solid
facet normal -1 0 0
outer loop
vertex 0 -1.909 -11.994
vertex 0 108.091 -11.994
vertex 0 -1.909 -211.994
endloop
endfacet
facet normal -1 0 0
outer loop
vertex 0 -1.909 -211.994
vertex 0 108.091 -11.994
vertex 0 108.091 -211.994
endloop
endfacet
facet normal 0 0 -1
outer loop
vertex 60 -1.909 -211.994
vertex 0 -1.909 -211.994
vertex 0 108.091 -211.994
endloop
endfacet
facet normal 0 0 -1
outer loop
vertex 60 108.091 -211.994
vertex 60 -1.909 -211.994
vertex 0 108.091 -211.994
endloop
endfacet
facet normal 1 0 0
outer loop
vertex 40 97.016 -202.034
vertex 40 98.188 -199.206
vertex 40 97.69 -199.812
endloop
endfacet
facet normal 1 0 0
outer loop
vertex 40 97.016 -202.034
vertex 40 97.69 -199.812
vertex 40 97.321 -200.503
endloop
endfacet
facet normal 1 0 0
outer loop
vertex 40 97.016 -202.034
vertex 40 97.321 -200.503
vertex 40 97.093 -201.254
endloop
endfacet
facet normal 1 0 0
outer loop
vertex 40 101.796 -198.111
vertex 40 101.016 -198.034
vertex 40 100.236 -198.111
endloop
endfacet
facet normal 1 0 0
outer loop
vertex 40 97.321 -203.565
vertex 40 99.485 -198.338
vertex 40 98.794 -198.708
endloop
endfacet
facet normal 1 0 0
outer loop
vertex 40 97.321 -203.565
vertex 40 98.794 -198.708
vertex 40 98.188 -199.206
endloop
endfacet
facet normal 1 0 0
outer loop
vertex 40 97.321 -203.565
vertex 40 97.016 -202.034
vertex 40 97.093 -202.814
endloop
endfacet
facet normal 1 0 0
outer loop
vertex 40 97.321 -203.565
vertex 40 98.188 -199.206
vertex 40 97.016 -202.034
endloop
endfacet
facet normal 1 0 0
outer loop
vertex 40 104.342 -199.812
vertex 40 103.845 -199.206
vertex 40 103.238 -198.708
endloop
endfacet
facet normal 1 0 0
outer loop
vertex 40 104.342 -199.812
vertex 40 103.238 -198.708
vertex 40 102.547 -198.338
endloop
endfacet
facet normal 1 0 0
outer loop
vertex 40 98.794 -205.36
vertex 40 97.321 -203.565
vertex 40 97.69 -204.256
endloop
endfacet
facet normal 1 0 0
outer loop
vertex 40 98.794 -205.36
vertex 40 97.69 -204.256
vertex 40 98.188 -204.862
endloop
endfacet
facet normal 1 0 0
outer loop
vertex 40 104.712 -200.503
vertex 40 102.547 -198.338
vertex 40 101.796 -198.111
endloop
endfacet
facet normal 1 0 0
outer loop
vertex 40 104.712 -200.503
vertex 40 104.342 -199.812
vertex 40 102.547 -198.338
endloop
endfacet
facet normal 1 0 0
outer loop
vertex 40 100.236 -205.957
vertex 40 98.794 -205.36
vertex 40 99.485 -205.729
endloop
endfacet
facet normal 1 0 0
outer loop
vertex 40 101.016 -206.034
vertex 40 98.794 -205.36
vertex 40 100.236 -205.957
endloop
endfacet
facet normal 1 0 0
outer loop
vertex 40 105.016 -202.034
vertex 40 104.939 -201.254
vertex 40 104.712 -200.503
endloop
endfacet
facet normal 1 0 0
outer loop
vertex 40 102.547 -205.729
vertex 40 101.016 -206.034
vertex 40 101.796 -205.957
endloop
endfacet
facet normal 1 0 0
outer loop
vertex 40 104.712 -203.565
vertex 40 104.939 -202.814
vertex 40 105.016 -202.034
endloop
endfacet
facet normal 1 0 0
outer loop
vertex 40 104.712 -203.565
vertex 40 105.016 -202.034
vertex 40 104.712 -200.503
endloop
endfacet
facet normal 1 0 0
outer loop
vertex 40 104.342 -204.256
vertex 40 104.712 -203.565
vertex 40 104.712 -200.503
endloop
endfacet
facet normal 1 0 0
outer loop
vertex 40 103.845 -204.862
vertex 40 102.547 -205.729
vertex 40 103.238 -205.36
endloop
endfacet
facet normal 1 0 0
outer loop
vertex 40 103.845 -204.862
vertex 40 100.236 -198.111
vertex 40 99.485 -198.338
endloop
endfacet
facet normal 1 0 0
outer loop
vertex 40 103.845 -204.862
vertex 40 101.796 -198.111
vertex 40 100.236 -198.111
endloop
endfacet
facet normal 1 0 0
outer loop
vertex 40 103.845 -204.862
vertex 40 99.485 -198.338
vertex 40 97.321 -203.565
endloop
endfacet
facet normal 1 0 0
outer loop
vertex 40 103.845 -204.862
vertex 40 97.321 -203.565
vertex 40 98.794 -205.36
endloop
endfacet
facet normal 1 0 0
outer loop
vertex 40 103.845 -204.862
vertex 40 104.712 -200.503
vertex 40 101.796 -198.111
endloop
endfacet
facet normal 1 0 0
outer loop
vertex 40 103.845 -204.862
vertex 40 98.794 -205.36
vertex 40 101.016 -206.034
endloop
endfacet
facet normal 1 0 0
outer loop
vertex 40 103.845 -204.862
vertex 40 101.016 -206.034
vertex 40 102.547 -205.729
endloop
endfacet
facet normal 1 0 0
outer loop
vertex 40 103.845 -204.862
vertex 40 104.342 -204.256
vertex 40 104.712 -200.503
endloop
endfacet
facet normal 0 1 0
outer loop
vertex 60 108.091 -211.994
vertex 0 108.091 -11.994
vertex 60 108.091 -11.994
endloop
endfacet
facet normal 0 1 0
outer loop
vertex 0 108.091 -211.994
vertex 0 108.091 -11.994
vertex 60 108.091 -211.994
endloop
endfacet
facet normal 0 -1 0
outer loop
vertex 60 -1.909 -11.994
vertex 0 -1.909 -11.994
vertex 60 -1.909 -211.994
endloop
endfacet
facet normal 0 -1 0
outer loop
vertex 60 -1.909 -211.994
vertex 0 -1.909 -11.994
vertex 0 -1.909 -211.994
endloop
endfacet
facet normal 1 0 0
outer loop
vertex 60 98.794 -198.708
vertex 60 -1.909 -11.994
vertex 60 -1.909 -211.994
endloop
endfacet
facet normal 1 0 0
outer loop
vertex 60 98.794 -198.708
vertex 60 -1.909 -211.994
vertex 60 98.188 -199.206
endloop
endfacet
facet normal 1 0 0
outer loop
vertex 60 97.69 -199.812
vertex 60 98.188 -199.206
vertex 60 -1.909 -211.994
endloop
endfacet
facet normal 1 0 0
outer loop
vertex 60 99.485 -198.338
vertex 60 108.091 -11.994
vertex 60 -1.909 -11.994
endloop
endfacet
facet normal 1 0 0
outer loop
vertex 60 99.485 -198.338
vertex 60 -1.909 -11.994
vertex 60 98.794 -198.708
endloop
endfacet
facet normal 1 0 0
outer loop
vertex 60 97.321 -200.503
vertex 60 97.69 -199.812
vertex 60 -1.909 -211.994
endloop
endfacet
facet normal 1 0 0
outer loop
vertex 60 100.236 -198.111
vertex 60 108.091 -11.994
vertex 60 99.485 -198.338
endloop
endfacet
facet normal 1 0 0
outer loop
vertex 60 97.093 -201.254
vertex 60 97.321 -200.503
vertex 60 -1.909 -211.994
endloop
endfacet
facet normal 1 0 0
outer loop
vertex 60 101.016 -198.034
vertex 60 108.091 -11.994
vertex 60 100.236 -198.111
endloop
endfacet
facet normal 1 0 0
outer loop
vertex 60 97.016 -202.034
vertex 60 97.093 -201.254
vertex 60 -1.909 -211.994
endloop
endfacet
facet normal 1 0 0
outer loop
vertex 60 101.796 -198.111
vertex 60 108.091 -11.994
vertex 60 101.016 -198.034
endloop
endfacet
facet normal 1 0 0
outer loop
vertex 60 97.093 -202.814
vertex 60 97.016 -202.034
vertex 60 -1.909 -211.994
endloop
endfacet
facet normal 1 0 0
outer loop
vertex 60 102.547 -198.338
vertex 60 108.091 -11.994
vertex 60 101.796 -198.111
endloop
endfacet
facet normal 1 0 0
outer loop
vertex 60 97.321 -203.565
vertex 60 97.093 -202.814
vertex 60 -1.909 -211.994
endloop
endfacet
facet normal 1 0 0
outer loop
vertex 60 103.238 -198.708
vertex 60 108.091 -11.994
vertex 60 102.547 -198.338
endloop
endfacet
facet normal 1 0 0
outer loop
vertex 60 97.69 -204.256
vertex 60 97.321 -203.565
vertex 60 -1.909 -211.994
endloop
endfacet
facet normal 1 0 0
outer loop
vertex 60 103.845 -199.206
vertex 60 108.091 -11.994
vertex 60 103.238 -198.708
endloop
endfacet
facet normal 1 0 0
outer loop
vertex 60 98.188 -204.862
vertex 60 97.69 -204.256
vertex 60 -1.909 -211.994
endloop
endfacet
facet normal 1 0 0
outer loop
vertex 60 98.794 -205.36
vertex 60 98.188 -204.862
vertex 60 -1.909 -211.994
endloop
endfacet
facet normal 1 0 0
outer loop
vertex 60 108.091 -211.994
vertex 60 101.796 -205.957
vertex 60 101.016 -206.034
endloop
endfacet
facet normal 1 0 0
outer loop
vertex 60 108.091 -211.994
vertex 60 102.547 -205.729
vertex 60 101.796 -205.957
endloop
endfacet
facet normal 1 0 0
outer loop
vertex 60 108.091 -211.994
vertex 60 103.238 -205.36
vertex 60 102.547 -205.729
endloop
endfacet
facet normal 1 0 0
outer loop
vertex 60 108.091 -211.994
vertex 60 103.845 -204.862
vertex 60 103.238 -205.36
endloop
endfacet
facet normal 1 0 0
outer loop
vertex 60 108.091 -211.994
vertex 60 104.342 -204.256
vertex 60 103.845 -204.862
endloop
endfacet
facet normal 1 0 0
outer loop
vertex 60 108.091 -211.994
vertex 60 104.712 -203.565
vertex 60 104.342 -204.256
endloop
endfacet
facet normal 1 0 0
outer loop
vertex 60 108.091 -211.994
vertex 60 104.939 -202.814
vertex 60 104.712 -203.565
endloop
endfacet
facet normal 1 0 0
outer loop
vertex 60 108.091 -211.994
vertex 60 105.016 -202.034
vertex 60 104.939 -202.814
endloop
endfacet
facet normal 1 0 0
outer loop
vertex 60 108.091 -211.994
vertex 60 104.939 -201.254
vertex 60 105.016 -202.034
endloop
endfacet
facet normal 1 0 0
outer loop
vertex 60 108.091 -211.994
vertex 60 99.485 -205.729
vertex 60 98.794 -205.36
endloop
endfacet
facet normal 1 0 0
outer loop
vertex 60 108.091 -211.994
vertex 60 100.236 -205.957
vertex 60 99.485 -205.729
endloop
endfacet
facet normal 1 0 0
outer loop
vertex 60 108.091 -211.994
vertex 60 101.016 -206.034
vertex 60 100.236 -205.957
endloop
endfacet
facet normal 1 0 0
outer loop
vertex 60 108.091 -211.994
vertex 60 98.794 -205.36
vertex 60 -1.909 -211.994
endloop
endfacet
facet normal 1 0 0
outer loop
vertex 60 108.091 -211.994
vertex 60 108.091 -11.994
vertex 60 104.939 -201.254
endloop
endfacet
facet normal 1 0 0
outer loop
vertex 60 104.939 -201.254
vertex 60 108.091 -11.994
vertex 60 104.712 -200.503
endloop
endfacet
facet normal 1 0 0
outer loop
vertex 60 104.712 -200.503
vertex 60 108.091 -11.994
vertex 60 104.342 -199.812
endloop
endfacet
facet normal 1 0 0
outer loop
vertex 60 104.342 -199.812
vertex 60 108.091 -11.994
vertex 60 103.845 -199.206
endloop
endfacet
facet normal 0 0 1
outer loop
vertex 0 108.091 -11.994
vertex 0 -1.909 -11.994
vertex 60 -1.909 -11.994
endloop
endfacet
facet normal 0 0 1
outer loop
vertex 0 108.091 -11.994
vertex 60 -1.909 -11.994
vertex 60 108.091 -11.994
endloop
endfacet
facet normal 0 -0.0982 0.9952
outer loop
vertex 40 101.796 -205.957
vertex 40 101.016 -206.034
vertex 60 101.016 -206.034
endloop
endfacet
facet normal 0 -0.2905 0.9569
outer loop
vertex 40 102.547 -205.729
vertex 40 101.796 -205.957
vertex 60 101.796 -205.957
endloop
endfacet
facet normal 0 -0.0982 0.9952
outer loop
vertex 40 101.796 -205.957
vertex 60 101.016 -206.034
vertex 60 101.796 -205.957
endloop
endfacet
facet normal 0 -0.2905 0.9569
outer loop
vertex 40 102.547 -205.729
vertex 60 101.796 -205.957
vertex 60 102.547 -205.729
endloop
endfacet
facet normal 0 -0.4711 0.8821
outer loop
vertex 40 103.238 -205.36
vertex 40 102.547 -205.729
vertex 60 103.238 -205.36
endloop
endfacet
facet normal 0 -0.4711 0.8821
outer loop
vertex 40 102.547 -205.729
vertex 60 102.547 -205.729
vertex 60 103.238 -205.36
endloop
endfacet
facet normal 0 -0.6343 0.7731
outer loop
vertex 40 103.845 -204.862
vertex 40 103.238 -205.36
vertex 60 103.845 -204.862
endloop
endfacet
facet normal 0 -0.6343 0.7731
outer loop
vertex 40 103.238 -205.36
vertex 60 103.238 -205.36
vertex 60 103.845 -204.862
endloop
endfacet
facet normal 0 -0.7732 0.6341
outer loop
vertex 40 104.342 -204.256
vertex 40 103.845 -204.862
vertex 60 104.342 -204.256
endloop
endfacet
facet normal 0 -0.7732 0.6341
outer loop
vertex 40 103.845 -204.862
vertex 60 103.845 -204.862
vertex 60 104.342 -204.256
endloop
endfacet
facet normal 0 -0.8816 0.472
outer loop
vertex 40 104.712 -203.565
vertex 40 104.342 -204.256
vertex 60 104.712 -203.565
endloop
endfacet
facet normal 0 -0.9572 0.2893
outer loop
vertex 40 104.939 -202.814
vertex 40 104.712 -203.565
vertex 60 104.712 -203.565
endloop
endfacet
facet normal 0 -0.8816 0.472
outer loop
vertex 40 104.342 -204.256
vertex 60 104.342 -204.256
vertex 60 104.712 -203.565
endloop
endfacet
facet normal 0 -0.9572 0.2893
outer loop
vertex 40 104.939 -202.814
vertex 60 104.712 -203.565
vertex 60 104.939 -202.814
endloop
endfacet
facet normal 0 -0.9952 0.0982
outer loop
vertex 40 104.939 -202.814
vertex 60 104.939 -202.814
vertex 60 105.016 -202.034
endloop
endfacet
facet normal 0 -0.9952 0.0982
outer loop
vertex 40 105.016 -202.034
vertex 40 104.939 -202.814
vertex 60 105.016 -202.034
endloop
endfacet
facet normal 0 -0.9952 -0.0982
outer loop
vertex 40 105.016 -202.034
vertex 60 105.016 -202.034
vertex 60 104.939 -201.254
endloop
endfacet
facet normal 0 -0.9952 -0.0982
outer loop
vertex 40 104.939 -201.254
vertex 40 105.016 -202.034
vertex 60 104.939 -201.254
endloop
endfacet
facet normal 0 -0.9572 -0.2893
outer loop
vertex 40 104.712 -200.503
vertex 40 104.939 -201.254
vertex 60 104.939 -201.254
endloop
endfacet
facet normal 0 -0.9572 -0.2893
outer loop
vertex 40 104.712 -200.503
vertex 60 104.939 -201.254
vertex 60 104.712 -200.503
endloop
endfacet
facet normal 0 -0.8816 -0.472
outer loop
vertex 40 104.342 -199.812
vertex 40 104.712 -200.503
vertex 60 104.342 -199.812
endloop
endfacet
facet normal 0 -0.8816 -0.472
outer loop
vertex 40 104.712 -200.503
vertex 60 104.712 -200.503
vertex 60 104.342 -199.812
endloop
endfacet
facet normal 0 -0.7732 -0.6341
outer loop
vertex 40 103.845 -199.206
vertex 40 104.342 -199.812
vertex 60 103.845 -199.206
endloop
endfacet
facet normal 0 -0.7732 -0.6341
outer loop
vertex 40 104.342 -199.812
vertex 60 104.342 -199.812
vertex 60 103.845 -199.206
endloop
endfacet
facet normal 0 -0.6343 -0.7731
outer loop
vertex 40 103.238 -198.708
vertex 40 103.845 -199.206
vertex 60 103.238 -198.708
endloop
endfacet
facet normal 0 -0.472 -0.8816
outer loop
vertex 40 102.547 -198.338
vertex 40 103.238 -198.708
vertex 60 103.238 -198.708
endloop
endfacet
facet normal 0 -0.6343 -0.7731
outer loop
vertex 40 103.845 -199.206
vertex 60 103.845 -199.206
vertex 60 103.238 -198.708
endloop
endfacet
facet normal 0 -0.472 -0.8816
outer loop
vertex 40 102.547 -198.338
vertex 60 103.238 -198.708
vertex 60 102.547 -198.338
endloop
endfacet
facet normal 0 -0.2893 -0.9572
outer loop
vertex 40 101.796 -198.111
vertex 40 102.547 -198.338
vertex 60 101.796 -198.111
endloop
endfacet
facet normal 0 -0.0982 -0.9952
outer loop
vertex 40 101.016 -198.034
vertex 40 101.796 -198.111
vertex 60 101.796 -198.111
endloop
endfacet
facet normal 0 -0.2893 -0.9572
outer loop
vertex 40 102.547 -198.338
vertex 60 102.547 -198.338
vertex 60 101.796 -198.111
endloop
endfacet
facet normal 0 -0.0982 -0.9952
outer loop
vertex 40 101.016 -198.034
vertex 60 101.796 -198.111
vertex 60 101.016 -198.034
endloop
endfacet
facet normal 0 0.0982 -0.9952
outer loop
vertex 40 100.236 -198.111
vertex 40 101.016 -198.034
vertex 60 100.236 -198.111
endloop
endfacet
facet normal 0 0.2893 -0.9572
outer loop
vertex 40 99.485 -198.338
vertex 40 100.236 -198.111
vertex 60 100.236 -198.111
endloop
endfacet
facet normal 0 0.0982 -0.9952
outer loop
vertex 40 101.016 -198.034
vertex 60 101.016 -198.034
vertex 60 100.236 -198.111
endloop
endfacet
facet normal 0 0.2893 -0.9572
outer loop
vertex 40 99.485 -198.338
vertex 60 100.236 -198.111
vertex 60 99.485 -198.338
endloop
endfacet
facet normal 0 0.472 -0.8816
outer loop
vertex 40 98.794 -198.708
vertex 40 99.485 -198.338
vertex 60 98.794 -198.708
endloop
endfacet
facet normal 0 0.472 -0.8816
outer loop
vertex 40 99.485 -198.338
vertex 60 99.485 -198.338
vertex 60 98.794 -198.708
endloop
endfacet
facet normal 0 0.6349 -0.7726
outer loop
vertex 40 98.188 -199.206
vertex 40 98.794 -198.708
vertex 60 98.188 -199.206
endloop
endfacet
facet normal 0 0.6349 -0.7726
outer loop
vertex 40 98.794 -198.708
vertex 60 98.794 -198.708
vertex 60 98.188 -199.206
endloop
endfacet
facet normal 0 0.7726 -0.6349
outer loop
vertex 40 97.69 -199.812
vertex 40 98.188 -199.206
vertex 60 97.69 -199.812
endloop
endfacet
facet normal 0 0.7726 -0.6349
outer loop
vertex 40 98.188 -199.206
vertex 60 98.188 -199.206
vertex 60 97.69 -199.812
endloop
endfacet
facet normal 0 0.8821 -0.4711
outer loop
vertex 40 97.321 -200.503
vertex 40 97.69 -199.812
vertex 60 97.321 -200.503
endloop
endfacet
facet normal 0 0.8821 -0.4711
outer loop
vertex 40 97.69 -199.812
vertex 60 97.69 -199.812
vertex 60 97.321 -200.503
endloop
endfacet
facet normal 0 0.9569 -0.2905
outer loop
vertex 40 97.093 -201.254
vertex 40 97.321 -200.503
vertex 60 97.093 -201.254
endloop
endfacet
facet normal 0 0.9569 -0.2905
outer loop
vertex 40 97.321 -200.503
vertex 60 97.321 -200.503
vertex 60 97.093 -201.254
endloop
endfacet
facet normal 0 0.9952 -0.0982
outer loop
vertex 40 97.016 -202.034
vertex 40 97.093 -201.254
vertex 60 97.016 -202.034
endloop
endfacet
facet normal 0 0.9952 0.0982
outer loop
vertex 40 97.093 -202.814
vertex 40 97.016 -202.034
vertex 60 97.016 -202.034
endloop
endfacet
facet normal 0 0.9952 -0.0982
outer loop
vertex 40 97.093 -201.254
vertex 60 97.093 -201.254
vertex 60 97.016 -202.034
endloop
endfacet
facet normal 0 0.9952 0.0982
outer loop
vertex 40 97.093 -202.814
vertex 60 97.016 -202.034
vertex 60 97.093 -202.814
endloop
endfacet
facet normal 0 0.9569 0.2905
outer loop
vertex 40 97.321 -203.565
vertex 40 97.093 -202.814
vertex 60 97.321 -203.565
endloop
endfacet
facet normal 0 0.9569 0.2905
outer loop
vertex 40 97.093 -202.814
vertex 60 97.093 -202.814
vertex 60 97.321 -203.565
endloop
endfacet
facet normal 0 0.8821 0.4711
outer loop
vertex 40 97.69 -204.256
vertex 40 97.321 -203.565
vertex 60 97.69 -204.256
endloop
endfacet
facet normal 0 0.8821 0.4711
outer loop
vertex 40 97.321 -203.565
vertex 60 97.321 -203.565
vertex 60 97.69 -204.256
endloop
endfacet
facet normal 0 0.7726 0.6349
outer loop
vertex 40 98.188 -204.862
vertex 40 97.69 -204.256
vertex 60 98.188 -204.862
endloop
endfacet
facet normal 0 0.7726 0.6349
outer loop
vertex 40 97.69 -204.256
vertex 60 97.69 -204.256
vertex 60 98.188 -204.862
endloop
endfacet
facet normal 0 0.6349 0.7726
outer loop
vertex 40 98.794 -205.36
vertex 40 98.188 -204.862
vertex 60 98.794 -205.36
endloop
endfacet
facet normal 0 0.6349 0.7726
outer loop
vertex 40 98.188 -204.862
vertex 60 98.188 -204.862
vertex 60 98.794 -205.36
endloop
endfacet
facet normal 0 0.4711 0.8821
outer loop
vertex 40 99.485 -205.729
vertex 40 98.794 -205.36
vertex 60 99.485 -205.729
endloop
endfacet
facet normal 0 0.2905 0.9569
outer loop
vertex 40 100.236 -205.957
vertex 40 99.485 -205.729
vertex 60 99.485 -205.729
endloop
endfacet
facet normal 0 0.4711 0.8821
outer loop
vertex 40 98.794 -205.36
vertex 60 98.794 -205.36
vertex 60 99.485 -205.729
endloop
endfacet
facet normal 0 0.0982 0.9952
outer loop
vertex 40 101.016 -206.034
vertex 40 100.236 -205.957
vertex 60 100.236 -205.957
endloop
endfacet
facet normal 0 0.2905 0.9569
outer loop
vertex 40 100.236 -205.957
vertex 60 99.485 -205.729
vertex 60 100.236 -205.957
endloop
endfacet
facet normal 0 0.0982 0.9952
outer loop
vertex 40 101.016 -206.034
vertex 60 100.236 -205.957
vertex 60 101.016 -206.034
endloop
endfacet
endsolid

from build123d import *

# Parameters (mm, degrees)
SKETCH_1_W          = 200
SKETCH_1_H          = 110
EXTRUDE_1_DEPTH     = 60
SKETCH_3_R          = 4
CUT_EXTRUDE_2_DEPTH = 20


with BuildPart() as part:
    # Эскиз1 → Бобышка-Вытянуть1 (new body)
    with BuildSketch(Plane(origin=(0, 0, 0), x_dir=(0, 0, -1), z_dir=(1, 0, 0))):
        with Locations((111.99379123, 53.09072323)):
            Rectangle(SKETCH_1_W, SKETCH_1_H)
    extrude(amount=EXTRUDE_1_DEPTH)

    # Эскиз3 → Вырез-Вытянуть2 (cut)
    with BuildSketch(Plane(origin=(60, 0, 0), x_dir=(0, 0, -1), z_dir=(1, 0, 0))):
        with Locations((202.033930041, 101.016084536)):
            Circle(SKETCH_3_R)
    extrude(amount=-CUT_EXTRUDE_2_DEPTH, mode=Mode.SUBTRACT)


solid = part.part
